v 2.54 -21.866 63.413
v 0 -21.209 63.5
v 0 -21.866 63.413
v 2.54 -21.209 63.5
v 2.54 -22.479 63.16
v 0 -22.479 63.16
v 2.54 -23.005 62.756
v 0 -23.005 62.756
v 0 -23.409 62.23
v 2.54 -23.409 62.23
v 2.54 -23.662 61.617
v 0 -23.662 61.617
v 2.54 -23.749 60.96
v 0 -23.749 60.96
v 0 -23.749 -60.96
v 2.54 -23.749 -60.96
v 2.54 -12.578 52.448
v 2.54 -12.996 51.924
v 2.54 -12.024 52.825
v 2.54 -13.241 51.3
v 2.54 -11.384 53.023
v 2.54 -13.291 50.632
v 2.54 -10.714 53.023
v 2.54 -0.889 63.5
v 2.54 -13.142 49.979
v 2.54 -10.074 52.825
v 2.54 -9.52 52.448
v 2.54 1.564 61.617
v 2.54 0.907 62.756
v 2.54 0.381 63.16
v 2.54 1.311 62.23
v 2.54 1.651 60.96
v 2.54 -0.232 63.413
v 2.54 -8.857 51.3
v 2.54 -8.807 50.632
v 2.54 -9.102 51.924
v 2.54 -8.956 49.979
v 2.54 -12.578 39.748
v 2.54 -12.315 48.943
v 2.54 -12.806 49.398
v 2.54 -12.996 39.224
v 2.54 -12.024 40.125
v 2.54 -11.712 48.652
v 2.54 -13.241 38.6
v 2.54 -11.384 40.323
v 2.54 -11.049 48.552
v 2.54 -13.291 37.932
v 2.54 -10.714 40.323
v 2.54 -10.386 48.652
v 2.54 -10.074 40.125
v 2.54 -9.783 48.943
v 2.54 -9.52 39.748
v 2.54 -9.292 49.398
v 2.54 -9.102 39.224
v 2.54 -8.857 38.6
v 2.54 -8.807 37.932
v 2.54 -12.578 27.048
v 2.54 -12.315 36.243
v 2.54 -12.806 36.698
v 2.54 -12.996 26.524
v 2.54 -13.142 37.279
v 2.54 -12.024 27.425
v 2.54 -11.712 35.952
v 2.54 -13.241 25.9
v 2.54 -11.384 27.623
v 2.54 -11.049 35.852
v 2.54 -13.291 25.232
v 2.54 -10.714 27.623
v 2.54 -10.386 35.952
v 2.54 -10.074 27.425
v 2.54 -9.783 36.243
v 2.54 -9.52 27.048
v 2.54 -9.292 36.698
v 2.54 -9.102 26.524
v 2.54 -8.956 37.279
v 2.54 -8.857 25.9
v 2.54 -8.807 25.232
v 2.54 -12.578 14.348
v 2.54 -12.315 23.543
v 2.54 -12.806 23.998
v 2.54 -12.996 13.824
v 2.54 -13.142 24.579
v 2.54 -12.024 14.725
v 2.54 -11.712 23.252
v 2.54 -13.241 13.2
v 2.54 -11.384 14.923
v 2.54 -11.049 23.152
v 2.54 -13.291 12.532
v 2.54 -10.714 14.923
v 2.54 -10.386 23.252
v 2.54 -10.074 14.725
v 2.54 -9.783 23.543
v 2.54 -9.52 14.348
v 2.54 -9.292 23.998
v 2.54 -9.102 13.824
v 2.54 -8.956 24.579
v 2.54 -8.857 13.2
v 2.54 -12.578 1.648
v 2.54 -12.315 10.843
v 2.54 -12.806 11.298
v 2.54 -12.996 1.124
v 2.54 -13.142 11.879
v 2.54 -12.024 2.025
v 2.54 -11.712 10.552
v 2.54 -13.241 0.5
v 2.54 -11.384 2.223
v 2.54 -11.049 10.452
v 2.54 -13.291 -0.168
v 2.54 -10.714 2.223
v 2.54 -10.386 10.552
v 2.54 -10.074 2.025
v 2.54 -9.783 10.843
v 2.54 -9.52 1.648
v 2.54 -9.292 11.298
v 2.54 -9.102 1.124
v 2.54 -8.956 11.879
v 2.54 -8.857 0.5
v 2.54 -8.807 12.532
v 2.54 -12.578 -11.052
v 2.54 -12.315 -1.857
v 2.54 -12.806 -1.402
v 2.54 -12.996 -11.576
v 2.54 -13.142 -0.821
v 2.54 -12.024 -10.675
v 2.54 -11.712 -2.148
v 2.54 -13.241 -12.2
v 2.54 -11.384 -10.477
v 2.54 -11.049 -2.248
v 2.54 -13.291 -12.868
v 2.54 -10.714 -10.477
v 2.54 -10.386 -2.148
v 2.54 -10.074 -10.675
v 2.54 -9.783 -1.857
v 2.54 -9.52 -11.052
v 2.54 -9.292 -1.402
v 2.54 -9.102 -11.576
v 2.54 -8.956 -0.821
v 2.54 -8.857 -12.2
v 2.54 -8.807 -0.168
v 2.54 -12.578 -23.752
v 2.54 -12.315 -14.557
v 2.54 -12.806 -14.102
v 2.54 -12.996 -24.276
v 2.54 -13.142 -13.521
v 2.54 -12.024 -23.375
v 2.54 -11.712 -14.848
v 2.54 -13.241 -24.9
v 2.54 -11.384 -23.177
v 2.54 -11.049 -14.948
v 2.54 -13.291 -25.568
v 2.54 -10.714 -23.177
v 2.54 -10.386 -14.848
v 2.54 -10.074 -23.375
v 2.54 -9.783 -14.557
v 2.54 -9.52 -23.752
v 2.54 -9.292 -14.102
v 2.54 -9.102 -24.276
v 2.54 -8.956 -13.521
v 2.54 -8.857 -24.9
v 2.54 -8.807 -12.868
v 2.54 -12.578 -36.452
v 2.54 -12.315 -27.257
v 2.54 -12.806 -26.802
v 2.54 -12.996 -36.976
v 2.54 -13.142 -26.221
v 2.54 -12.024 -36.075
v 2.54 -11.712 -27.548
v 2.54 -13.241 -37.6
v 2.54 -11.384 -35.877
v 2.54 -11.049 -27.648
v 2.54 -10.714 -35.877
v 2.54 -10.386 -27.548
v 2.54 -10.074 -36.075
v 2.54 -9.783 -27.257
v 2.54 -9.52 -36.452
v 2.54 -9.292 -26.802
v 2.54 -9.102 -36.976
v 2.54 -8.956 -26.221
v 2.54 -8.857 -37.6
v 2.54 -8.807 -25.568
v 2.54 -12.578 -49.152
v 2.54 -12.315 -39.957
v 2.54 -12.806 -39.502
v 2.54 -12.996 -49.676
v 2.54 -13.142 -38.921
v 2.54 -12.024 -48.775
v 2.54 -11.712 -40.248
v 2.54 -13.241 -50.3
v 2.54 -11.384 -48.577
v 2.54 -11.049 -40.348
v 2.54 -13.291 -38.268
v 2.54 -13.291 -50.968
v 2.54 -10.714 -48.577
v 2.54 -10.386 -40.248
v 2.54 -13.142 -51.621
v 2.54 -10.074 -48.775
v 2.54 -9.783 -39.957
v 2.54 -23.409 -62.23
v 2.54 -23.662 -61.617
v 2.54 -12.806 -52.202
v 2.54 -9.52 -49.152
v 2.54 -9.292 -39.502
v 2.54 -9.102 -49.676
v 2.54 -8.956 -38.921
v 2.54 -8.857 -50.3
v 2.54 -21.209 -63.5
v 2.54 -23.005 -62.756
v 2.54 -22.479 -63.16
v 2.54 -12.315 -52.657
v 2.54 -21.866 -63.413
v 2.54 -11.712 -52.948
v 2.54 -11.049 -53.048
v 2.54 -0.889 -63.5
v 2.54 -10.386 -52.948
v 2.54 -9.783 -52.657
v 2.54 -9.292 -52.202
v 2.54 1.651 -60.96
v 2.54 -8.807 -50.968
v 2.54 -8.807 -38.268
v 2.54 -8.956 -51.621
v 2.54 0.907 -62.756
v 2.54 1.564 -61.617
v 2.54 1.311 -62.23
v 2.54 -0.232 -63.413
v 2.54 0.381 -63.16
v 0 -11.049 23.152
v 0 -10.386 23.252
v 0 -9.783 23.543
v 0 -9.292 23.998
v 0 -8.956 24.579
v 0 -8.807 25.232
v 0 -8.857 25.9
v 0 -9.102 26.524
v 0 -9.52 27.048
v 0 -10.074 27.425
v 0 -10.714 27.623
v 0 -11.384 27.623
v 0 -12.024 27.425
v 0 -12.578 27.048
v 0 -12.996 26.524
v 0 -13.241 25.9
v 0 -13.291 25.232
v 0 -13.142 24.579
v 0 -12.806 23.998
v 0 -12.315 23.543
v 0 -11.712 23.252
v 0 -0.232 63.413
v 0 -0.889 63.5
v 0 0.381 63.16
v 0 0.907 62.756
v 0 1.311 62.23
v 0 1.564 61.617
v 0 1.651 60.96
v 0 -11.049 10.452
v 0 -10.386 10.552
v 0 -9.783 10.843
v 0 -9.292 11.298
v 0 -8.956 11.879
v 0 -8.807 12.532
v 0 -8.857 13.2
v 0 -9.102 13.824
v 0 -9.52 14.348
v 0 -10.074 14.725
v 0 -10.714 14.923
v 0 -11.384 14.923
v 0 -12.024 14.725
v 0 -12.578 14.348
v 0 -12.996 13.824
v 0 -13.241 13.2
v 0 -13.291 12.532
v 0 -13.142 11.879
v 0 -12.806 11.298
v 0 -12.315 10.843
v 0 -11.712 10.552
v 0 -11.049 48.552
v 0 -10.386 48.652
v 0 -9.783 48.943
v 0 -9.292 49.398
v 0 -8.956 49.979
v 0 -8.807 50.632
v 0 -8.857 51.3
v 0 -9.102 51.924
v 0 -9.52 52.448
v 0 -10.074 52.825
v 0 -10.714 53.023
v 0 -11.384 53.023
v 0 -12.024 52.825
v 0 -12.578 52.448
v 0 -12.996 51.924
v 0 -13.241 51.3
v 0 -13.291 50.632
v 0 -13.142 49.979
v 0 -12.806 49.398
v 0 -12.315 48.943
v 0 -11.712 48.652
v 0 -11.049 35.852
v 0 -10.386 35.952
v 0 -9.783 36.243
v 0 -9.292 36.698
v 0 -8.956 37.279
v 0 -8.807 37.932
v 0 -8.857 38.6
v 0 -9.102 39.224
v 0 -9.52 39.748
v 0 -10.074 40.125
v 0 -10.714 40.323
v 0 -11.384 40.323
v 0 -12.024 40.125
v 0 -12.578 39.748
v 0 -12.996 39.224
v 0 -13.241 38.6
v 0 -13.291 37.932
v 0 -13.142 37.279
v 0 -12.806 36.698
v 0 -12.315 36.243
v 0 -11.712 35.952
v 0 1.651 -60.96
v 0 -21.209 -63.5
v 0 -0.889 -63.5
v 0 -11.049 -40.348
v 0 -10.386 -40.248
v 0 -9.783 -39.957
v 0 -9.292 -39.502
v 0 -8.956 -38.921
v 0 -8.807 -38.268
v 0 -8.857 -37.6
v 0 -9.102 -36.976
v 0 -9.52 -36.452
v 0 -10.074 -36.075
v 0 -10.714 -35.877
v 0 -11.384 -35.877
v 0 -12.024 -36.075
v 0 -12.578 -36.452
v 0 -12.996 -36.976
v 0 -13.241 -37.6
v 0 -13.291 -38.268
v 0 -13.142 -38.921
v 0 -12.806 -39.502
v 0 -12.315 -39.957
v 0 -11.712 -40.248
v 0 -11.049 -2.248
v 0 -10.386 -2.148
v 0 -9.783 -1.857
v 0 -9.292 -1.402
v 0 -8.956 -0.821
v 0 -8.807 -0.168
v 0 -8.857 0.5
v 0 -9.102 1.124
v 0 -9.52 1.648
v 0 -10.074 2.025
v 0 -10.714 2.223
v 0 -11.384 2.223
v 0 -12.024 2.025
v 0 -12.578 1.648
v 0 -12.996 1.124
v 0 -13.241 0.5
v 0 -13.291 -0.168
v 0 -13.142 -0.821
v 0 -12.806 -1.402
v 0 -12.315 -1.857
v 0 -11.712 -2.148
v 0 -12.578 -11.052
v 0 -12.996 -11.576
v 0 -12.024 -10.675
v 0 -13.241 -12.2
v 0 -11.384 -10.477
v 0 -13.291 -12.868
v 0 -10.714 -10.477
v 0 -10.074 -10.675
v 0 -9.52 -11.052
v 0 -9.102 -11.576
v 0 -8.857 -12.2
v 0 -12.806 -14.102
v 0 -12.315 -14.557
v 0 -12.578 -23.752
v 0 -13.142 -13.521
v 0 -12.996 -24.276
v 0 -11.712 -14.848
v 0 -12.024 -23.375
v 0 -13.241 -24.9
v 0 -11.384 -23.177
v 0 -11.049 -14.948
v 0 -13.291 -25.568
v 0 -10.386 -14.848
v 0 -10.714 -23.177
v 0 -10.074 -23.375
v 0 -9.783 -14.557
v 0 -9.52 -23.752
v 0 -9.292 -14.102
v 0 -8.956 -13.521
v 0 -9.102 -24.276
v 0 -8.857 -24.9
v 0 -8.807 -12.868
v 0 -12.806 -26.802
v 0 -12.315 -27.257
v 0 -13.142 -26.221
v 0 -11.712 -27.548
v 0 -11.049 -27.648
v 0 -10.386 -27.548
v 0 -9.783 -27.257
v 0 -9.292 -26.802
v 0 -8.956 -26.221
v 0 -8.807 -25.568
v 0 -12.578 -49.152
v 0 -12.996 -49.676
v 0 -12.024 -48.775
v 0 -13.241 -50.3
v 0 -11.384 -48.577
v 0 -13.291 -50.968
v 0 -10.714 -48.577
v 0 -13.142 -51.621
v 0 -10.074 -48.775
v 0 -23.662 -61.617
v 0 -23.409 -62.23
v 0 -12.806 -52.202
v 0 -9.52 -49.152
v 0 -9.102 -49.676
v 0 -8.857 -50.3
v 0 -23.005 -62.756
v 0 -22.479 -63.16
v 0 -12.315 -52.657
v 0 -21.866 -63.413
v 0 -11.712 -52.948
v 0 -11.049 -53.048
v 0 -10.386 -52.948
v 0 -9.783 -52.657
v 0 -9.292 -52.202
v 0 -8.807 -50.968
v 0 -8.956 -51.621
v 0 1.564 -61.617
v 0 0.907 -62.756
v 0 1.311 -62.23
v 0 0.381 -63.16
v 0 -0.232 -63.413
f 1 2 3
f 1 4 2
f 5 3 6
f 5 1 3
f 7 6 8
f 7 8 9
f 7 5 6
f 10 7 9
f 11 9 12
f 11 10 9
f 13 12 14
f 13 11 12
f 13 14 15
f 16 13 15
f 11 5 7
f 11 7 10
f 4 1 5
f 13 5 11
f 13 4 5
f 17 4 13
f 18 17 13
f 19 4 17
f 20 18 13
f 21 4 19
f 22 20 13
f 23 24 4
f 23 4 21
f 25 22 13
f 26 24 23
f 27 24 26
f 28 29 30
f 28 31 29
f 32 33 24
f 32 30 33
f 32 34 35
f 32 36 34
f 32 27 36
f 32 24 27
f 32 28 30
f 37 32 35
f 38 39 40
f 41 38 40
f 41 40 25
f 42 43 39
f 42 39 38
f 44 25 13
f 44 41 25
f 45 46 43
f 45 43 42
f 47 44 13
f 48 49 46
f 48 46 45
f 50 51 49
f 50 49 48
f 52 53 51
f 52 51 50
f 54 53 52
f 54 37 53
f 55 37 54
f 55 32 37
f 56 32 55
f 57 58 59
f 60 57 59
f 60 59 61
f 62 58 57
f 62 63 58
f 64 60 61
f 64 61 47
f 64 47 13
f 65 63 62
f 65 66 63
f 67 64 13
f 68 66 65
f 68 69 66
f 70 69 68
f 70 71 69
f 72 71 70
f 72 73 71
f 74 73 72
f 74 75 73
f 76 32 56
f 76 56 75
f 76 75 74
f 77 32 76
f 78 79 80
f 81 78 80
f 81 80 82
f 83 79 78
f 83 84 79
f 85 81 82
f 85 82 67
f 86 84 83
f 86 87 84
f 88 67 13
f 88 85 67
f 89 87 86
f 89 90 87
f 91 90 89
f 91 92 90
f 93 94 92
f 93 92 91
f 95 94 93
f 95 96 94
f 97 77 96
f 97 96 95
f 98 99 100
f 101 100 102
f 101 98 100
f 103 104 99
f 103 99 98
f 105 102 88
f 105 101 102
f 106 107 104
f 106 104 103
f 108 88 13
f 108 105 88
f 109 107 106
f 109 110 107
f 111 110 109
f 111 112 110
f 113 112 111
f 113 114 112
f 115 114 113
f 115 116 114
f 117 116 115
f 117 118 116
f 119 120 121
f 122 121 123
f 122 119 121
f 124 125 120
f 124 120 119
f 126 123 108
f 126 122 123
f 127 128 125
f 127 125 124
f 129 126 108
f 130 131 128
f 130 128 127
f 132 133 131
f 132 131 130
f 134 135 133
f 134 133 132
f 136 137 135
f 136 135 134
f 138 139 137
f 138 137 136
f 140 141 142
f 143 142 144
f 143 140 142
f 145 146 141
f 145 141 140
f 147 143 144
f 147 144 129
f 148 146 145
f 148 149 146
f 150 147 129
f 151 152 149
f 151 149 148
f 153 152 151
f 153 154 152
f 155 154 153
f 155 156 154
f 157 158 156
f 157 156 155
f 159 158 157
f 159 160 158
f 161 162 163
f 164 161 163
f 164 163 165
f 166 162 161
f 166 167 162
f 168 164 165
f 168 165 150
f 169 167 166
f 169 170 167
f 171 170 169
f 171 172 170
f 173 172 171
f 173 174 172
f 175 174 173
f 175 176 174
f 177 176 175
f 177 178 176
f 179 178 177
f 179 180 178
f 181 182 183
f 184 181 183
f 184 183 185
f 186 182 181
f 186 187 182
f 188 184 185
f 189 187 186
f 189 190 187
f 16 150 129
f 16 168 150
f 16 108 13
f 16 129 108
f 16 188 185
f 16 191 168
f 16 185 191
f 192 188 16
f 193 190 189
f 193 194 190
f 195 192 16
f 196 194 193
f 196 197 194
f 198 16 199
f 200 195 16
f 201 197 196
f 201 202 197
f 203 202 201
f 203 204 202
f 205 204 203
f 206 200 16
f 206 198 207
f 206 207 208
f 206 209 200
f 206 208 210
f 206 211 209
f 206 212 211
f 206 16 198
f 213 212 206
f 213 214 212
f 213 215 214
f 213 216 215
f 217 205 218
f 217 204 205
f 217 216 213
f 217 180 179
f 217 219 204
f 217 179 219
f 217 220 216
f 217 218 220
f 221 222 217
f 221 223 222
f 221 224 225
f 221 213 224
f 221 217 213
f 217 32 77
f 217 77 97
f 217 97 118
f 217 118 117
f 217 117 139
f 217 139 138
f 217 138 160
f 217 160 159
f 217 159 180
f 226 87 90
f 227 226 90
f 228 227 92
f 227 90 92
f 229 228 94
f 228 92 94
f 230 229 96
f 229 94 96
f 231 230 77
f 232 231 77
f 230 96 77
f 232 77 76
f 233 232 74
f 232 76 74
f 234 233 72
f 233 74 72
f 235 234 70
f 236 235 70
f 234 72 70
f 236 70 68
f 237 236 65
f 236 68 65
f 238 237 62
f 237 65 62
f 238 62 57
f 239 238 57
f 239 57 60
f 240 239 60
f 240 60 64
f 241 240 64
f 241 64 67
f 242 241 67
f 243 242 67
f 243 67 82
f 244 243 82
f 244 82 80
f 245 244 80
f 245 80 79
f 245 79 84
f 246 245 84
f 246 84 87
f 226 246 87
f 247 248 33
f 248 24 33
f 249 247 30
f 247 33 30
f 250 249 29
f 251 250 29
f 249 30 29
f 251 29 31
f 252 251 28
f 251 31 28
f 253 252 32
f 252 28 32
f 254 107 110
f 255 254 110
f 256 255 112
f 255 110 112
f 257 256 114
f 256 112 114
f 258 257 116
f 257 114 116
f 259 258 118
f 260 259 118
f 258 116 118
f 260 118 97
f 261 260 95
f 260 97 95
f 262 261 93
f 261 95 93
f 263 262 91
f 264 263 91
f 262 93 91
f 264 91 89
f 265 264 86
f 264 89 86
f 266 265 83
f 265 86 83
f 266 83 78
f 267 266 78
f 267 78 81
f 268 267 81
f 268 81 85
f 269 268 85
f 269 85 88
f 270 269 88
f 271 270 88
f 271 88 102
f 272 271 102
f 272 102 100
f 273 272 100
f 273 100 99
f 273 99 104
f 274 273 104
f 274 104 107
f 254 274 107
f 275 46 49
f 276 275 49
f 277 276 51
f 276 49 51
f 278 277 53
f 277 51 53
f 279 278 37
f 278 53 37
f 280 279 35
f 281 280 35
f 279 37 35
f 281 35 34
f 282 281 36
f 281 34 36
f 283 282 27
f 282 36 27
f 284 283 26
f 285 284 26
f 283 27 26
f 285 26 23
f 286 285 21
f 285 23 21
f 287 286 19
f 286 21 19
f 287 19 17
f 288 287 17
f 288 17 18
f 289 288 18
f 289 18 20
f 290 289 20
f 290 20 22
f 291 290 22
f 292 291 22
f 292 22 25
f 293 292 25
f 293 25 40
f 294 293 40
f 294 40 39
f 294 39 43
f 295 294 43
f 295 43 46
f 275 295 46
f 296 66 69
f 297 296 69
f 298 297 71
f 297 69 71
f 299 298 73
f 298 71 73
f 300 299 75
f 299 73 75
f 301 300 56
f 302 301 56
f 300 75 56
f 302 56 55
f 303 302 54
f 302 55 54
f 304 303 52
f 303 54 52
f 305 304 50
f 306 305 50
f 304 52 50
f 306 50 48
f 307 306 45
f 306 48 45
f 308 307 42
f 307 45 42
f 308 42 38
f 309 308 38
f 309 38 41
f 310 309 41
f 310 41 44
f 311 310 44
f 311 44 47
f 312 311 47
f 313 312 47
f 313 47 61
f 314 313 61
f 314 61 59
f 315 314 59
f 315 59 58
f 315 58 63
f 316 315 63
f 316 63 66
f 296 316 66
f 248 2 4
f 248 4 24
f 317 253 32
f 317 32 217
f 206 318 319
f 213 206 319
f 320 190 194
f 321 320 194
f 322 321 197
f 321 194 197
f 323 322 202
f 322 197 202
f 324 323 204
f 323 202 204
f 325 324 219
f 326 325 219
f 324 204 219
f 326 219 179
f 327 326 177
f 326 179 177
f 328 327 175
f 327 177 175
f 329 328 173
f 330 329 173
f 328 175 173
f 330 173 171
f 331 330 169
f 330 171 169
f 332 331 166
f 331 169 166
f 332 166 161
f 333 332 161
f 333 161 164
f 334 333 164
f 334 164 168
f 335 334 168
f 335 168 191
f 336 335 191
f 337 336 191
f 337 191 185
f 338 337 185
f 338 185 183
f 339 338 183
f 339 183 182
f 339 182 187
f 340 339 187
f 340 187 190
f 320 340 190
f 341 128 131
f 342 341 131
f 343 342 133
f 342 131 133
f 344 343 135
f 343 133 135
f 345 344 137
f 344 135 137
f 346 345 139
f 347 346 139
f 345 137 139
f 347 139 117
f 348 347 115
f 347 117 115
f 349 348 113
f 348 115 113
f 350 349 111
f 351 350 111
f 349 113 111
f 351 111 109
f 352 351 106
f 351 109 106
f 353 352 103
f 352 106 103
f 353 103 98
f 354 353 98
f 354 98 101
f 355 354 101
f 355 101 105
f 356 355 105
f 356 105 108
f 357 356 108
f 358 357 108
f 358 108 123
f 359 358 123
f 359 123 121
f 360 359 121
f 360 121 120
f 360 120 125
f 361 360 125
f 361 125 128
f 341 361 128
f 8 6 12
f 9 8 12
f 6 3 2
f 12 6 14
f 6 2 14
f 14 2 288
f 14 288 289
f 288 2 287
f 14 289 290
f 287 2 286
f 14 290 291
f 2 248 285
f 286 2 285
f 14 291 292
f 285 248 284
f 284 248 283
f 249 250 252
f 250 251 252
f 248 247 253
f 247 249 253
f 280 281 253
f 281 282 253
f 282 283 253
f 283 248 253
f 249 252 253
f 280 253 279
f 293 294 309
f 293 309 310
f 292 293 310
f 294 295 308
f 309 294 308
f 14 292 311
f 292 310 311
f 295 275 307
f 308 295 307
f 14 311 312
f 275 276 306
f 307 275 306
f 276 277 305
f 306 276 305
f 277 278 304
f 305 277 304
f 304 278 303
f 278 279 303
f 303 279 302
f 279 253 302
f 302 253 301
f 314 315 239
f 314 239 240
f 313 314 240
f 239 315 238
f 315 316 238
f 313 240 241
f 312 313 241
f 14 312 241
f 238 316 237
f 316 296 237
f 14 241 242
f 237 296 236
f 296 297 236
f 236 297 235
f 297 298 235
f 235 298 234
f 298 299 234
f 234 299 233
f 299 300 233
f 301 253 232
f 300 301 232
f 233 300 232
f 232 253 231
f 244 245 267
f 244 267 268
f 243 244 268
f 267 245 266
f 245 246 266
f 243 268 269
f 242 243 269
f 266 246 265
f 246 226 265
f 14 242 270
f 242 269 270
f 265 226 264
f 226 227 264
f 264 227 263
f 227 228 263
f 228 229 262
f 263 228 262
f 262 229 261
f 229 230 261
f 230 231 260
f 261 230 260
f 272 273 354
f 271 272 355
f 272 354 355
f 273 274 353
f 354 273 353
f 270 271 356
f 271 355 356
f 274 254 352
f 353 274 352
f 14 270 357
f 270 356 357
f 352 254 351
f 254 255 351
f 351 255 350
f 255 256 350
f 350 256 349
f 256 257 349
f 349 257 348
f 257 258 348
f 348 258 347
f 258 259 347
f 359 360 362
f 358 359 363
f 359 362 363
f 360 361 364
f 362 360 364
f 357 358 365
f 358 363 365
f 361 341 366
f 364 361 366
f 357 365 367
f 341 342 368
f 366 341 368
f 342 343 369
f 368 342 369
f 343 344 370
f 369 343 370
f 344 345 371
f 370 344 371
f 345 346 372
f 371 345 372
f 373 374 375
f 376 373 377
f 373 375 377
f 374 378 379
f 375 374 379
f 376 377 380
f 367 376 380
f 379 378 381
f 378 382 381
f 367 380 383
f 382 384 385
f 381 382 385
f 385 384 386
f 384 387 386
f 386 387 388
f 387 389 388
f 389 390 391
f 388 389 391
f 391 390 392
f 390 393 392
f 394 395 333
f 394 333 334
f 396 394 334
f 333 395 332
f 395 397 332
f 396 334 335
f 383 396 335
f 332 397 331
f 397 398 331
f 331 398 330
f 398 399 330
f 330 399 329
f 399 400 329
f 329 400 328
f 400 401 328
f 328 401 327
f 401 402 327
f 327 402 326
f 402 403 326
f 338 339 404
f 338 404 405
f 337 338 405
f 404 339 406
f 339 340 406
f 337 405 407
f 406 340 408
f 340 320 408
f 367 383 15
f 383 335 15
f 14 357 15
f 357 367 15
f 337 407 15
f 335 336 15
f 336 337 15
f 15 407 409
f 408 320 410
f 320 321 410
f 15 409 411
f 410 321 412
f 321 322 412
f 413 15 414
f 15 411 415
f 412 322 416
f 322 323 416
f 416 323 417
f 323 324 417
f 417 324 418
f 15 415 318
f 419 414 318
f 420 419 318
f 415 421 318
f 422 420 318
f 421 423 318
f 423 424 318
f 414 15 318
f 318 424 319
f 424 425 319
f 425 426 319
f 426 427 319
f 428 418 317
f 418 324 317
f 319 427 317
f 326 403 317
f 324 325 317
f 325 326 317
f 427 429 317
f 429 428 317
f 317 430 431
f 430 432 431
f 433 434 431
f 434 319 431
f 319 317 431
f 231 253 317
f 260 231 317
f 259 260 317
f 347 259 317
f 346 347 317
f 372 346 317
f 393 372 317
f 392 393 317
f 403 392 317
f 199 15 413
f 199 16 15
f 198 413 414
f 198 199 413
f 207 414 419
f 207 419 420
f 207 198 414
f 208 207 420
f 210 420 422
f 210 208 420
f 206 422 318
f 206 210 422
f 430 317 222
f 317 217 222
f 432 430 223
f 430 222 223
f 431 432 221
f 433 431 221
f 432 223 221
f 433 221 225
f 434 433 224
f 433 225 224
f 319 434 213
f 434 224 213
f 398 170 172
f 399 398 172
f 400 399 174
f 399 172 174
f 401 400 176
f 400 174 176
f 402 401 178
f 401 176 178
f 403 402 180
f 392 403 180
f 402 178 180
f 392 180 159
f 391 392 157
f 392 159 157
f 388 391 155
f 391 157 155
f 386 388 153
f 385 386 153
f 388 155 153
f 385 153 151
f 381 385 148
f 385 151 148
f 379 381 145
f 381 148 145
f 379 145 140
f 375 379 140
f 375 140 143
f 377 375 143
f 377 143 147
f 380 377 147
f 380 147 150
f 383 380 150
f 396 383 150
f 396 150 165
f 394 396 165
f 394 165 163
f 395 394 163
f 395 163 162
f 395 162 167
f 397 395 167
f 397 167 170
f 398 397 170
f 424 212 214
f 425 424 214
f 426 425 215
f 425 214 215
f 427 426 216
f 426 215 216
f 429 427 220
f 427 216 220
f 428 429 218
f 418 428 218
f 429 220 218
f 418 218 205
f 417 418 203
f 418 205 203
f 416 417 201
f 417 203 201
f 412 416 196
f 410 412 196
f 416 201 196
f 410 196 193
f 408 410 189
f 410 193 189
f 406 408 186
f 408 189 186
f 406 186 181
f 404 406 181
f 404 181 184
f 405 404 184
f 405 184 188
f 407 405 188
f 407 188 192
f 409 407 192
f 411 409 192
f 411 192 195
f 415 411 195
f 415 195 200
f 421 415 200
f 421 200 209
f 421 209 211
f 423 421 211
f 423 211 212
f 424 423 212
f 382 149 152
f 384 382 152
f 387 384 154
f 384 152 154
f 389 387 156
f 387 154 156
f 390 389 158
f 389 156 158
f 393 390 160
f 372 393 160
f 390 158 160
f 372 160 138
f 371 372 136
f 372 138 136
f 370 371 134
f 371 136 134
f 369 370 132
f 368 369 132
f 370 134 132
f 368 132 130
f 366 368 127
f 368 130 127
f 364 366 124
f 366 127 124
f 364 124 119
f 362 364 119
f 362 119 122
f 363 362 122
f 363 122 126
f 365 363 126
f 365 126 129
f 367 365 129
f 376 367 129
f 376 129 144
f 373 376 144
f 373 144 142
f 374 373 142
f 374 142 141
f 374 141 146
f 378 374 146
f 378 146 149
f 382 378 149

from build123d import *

# Parameters (mm, degrees)
SKETCH1_W             = 127
SKETCH1_H             = 25.4
BOSS_EXTRUDE1_DEPTH   = 2.54
F_8_CLEARANCE_HOLE1_D = 4.4958
FILLET1_R             = 2.54


with BuildPart() as part:
    # Sketch1 → Boss-Extrude1 (new body)
    with BuildSketch(Plane(origin=(0, 0, 0), x_dir=(0, 0, -1), z_dir=(1, 0, 0))):
        with Locations((0, -11.049)):
            Rectangle(SKETCH1_W, SKETCH1_H)
    extrude(amount=BOSS_EXTRUDE1_DEPTH)

    # #8 Clearance Hole1 (through all)
    with Locations(Plane.ZY):
        with Locations((-50.8, -11.049), (-25.4, -11.049), (-38.1, -11.049), (0, -11.049), (25.4, -11.049), (50.8, -11.049), (-12.7, -11.049), (12.7, -11.049), (38.1, -11.049)):
            Hole(F_8_CLEARANCE_HOLE1_D / 2)

    # Fillet1
    fillet1_edges = [part.edges().sort_by_distance(p)[0] for p in [
        (1.27, -23.749, 63.5),
        (1.27, 1.651, 63.5),
        (1.27, 1.651, -63.5),
        (1.27, -23.749, -63.5),
    ]]
    fillet(fillet1_edges, radius=FILLET1_R)


solid = part.part
